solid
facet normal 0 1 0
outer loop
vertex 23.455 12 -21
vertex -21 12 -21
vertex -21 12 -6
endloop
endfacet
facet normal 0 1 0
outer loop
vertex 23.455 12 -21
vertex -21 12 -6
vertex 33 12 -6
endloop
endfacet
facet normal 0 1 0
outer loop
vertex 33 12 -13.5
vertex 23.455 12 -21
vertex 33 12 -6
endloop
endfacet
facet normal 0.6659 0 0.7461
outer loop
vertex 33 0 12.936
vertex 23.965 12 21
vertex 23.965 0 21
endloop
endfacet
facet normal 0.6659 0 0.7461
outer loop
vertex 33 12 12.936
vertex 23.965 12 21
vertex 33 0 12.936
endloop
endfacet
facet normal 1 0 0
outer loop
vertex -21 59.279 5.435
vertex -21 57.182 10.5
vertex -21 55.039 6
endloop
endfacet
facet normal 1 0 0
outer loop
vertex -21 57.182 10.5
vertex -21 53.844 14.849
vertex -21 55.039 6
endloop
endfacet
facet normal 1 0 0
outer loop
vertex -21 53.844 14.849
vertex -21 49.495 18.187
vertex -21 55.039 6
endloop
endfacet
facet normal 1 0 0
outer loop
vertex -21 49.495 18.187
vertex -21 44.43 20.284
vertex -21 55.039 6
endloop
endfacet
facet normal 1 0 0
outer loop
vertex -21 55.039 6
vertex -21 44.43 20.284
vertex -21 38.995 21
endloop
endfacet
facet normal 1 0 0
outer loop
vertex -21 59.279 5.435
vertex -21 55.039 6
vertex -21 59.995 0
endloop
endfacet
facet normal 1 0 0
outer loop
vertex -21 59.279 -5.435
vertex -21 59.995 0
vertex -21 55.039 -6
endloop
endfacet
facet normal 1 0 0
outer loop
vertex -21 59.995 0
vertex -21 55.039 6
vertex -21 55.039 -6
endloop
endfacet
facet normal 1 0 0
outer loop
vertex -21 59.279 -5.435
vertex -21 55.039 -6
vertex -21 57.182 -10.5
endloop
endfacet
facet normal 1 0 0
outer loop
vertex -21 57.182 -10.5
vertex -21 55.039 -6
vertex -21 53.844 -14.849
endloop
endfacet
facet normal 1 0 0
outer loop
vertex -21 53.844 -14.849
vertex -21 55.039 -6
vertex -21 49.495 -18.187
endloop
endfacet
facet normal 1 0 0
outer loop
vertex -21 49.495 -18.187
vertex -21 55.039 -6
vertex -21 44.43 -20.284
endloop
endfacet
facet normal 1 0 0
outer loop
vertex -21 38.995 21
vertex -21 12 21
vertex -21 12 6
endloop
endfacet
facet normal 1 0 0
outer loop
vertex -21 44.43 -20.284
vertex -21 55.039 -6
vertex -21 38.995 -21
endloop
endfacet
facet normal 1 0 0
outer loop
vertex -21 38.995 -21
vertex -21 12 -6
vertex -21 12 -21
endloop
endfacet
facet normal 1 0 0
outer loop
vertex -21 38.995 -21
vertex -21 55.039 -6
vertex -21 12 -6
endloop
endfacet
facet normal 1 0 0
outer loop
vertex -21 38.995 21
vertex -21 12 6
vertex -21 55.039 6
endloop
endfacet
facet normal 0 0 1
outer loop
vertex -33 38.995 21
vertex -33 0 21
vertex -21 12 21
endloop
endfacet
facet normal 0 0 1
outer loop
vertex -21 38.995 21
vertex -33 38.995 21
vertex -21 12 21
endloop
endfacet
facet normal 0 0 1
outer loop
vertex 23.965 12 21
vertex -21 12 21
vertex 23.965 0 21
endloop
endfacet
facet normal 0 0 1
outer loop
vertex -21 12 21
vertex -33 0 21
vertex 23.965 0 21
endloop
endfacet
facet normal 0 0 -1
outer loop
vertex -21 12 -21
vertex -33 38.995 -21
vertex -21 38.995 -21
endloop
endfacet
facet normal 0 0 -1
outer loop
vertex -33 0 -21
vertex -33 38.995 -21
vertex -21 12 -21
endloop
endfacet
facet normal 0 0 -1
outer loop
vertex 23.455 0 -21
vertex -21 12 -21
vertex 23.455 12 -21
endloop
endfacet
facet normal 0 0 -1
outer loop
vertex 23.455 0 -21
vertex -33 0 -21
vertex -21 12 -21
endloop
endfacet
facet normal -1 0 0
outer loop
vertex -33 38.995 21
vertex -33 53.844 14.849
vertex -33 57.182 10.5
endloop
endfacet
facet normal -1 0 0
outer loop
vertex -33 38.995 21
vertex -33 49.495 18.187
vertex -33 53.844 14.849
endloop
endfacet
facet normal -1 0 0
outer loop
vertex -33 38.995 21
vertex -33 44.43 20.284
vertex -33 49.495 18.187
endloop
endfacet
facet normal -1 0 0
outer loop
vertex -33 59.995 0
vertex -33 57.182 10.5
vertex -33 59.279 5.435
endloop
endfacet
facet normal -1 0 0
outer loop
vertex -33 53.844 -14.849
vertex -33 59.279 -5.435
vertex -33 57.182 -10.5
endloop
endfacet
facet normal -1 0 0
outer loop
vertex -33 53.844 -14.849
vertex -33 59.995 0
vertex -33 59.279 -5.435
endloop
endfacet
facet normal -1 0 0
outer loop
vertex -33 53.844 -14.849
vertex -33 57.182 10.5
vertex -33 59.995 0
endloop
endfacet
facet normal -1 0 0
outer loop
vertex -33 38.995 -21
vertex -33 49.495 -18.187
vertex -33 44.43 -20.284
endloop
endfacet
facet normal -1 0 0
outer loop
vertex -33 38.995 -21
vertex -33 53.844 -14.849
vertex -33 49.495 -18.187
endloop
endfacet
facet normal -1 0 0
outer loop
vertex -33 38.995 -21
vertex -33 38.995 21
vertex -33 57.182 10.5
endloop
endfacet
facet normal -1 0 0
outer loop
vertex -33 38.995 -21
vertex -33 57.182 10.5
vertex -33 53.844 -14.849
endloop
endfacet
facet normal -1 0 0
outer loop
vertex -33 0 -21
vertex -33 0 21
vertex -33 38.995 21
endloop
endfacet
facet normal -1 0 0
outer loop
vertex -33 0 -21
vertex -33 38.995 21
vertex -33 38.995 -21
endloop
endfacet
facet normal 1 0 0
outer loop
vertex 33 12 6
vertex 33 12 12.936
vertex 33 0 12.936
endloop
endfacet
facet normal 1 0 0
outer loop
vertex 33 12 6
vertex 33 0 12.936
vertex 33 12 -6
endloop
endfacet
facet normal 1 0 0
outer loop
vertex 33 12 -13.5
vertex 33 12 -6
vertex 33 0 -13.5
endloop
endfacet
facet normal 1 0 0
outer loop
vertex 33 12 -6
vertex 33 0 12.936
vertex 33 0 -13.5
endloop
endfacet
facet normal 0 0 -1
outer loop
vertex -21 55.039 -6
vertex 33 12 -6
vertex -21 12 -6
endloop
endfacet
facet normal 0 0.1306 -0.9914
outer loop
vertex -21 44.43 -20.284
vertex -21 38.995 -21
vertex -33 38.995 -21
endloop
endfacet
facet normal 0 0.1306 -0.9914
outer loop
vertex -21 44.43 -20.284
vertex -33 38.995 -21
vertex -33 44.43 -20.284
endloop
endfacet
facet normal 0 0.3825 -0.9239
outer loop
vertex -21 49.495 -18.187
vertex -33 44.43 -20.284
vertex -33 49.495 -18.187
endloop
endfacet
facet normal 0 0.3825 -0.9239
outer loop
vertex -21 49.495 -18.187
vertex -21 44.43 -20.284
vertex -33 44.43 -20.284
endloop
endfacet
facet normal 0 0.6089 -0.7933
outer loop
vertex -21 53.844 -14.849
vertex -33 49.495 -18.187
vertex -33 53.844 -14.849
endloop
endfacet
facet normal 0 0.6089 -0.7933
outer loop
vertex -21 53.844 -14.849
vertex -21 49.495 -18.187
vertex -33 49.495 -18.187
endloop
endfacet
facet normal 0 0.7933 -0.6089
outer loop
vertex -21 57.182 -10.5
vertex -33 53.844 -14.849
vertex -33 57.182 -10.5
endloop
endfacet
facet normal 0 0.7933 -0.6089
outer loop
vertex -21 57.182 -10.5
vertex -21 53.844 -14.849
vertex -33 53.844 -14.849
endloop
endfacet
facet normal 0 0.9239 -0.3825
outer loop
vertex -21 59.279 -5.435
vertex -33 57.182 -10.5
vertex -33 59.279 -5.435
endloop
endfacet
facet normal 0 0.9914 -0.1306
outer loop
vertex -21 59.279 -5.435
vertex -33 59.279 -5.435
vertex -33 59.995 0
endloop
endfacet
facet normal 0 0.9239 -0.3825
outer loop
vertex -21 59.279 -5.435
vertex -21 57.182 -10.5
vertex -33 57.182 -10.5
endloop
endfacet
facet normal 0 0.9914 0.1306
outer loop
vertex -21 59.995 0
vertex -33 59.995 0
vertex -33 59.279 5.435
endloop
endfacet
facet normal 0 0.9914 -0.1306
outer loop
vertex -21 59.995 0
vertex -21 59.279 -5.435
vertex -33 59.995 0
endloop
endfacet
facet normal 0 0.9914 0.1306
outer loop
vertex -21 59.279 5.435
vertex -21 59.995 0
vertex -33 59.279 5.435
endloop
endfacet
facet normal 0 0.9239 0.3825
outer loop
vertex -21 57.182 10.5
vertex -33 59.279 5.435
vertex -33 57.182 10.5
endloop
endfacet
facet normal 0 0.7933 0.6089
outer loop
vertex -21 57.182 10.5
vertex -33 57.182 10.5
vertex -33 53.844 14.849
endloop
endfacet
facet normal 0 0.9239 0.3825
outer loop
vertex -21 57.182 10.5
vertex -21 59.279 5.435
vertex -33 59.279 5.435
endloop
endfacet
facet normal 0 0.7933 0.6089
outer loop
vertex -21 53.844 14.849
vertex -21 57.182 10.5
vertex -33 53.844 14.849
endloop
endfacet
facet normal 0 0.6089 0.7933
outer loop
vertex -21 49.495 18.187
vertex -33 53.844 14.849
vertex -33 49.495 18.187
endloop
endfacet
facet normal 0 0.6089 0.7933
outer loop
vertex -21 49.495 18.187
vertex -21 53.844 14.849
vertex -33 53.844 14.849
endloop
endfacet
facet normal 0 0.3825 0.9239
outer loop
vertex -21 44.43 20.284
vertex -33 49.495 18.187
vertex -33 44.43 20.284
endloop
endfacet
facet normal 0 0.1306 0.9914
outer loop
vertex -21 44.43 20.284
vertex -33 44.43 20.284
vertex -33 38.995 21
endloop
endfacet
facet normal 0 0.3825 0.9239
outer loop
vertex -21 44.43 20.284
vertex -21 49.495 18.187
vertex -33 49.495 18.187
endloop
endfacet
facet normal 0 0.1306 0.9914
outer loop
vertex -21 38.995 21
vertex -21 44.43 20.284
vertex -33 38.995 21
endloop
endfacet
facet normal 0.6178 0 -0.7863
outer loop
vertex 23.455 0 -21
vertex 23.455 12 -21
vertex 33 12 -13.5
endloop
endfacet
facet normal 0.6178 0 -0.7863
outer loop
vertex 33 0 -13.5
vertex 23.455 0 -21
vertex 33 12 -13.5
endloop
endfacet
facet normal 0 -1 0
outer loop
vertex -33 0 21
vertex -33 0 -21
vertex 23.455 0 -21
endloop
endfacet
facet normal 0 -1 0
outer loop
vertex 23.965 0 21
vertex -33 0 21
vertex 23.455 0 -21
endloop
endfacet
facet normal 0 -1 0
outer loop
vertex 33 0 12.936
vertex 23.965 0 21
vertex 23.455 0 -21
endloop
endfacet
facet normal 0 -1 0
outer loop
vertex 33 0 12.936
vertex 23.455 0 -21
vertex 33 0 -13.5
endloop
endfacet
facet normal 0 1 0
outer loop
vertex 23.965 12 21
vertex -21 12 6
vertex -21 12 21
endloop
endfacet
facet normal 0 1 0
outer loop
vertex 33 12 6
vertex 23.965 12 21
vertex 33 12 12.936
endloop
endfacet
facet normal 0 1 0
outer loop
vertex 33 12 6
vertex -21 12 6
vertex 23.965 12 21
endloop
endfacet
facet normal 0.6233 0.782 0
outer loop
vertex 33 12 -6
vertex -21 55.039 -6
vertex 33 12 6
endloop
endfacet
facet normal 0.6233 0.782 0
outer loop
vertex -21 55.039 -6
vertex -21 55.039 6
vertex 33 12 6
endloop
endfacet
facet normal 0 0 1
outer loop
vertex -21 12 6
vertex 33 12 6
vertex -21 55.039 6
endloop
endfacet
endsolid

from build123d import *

# Parameters (mm, degrees)
SKETCH1_W           = 66
SKETCH1_H           = 42
BOSS_EXTRUDE1_DEPTH = 12
SKETCH2_W           = 12
SKETCH2_H           = 42
BOSS_EXTRUDE2_DEPTH = 26.995042498
SKETCH4_R           = 21
BOSS_EXTRUDE8_DEPTH = 12
BOSS_EXTRUDE9_DEPTH = 6
CUT_EXTRUDE1_DEPTH  = 12


with BuildPart() as part:
    # Sketch1 → Boss-Extrude1 (new body)
    with BuildSketch(Plane(origin=(0, 0, 0), x_dir=(1, 0, 0), z_dir=(0, 1, 0))):
        Rectangle(SKETCH1_W, SKETCH1_H)
    extrude(amount=BOSS_EXTRUDE1_DEPTH)

    # Sketch2 → Boss-Extrude2 (add)
    with BuildSketch(Plane(origin=(0, 12, 0), x_dir=(1, 0, 0), z_dir=(0, 1, 0))):
        with Locations((-27, 0)):
            Rectangle(SKETCH2_W, SKETCH2_H)
    extrude(amount=BOSS_EXTRUDE2_DEPTH)

    # Sketch4 → Boss-Extrude8 (add)
    with BuildSketch(Plane(origin=(-21, 0, 0), x_dir=(0, 0, -1), z_dir=(1, 0, 0))):
        with Locations((0, 38.995042498)):
            Circle(SKETCH4_R)
    extrude(amount=-BOSS_EXTRUDE8_DEPTH)

    # Sketch8 → Boss-Extrude9 (add, symmetric)
    with BuildSketch(Plane.XY):
        Polygon((-21, 12), (-21, 55.038969321), (33, 12), align=None)
    extrude(amount=BOSS_EXTRUDE9_DEPTH, both=True)

    # Sketch12 → Cut-Extrude1 (cut)
    with BuildSketch(Plane(origin=(0, 12, 0), x_dir=(1, 0, 0), z_dir=(0, 1, 0))):
        Polygon((33, -12.935780303), (33, -21), (23.965356614, -21), align=None)
        Polygon((33, 13.5), (33, 21), (23.455136658, 21), align=None)
    extrude(amount=-CUT_EXTRUDE1_DEPTH, mode=Mode.SUBTRACT)


solid = part.part
